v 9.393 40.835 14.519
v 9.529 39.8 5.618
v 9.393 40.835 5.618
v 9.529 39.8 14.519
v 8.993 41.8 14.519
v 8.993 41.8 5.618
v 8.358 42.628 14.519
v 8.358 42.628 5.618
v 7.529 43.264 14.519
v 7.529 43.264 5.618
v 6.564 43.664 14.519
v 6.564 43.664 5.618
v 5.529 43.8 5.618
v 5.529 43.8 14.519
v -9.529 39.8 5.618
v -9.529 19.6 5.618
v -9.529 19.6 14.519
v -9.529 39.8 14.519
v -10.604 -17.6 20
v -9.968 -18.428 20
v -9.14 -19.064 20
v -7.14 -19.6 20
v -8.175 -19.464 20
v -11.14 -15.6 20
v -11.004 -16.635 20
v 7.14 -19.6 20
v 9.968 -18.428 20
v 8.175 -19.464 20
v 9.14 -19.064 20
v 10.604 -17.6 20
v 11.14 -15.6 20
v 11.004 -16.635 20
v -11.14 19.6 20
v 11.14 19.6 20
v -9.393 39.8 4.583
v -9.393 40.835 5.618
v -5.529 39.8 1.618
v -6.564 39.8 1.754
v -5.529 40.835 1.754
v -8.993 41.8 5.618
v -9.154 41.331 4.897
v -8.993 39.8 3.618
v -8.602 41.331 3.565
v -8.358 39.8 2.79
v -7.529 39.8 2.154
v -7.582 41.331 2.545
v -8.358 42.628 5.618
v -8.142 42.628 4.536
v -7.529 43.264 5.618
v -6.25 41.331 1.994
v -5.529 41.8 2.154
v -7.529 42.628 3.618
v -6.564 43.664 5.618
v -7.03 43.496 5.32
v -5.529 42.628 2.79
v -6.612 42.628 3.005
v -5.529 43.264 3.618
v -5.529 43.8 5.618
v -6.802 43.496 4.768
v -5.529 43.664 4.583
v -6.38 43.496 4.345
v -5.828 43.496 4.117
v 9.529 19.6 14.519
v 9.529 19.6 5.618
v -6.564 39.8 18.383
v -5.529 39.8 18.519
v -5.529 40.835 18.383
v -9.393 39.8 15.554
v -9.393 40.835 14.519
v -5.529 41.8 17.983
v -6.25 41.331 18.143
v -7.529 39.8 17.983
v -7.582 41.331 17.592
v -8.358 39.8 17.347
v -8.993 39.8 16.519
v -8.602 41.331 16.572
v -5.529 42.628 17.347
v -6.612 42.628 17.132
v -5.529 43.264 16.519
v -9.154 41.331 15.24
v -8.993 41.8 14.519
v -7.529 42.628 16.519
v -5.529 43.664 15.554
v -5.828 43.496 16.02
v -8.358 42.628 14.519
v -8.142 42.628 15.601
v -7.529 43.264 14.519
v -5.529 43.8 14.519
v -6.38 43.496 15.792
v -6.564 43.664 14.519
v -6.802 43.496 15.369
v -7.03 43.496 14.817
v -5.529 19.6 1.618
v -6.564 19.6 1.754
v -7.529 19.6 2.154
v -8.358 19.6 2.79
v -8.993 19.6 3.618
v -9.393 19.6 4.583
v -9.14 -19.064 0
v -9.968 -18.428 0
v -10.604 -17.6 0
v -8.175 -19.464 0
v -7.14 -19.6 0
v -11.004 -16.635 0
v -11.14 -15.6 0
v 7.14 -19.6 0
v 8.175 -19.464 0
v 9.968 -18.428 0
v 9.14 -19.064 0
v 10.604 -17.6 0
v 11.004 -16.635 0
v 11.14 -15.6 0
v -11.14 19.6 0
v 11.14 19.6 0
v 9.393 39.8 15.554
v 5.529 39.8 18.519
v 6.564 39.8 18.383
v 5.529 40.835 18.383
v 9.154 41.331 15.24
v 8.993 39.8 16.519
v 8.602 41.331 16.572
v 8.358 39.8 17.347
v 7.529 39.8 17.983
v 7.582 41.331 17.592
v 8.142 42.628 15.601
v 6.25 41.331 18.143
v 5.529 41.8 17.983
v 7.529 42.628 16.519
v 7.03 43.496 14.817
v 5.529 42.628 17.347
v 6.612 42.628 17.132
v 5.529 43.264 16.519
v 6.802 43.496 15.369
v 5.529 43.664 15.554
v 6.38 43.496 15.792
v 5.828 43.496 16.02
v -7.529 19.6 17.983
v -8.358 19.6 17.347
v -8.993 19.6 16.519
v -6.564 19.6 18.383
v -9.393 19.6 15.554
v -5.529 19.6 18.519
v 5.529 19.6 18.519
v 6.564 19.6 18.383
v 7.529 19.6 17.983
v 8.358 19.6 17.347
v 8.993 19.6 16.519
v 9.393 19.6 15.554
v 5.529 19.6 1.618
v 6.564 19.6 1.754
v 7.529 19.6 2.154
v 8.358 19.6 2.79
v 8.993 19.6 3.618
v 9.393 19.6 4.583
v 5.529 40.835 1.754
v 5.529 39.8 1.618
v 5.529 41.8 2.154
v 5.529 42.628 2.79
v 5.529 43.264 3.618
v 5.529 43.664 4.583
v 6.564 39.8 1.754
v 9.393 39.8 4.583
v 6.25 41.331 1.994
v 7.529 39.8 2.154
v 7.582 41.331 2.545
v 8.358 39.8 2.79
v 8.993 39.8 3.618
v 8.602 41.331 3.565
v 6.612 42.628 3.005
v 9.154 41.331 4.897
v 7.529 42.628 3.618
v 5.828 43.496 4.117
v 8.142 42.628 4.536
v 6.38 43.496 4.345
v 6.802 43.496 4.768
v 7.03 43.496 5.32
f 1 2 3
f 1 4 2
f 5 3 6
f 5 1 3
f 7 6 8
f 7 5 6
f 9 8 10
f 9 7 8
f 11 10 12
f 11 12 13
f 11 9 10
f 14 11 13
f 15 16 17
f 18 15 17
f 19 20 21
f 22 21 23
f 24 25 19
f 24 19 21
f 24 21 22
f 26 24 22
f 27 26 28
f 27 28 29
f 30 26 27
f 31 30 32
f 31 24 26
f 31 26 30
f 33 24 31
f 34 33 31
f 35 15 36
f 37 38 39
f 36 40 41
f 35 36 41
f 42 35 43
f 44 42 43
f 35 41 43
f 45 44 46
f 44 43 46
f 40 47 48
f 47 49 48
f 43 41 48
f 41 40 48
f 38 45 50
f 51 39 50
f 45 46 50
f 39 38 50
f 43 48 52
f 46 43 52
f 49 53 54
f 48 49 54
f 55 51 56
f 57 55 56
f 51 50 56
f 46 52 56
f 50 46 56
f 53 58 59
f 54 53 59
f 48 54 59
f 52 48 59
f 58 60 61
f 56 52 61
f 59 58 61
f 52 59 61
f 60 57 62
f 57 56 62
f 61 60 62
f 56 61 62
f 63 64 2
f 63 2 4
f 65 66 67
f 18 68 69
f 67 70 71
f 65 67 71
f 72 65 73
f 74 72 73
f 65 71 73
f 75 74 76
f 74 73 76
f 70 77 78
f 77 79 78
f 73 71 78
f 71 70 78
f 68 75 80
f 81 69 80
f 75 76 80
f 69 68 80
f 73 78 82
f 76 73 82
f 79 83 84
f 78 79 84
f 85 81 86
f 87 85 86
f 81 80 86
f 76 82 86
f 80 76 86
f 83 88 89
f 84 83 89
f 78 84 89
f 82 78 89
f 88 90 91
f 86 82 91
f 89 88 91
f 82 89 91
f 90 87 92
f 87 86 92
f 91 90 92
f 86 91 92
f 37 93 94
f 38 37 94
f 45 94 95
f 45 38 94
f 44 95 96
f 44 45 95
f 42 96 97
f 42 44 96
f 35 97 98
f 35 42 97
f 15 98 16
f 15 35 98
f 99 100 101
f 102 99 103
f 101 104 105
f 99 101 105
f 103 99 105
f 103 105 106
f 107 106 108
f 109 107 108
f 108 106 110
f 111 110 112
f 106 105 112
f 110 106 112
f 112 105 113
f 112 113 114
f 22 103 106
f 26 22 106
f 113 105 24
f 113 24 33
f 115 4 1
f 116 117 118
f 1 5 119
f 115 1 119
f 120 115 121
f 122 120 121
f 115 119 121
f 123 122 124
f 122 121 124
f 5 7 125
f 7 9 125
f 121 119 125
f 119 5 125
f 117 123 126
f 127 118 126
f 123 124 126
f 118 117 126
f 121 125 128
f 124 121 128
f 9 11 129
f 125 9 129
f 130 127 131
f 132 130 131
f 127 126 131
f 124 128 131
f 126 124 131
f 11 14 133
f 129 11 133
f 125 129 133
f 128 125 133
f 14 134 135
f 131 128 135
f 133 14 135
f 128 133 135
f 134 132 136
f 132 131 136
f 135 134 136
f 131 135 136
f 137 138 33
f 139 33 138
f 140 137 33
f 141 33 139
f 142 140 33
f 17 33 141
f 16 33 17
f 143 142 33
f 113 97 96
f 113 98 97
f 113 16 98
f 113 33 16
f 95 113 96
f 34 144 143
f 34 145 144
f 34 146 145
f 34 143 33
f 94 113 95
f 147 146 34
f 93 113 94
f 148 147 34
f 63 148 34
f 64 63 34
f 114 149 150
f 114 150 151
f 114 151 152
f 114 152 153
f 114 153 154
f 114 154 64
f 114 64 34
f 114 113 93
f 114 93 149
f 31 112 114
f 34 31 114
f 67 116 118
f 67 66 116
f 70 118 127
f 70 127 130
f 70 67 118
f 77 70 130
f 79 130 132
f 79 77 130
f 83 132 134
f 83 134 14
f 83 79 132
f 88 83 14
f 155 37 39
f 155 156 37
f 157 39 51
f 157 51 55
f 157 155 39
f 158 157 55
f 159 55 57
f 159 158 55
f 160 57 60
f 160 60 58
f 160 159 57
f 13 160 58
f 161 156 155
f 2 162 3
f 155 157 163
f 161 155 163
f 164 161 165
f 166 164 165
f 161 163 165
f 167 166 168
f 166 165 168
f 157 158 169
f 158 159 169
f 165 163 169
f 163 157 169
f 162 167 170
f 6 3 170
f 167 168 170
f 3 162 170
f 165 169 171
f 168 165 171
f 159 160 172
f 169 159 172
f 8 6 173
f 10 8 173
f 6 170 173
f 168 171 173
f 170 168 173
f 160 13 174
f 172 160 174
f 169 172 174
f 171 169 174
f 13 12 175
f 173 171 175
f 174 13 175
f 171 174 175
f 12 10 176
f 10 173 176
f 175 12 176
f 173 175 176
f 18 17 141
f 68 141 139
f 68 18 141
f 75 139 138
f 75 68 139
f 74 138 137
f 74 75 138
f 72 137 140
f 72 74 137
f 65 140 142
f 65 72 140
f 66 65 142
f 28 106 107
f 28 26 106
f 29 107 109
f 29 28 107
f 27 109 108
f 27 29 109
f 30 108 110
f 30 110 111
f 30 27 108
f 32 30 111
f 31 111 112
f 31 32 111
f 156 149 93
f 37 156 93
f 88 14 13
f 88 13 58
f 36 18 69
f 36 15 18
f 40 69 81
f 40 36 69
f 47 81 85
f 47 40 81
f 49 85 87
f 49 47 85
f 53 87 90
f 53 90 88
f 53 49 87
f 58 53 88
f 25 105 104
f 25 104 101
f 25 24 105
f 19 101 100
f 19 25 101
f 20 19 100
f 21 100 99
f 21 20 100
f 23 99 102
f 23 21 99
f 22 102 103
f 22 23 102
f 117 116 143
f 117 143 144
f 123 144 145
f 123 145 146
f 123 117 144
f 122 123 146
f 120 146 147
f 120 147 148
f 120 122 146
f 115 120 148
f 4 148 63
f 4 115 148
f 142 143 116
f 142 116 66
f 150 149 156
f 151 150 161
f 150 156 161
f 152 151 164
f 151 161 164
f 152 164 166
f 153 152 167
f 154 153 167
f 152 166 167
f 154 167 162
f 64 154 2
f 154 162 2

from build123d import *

# Parameters (mm, degrees)
F0_W     = 22.28
F0_H     = 39.2
F1_DEPTH = 20
F2_R     = 4
F3_W     = 19.058216
F3_H     = 16.900683
F4_DEPTH = 24.2
F5_R     = 4
F6_R     = 4


with BuildPart() as f1:
    # F0 (on Top) → F1 (new body)
    with BuildSketch(Plane.XY):
        Rectangle(F0_W, F0_H)
    extrude(amount=F1_DEPTH)

    # F2
    f2_edges = [f1.edges().sort_by_distance(p)[0] for p in [
        (-11.14, -19.6, 10),
        (11.14, -19.6, 10),
    ]]
    fillet(f2_edges, radius=F2_R)

    # F3 (on face) → F4 (join)
    with BuildSketch(Plane(origin=(0, 19.6, 0), x_dir=(-1, 0, 0), z_dir=(0, 1, 0))):
        with Locations((0, 10.068494)):
            Rectangle(F3_W, F3_H)
    extrude(amount=F4_DEPTH)

    # F5
    f5_edges = [f1.edges().sort_by_distance(p)[0] for p in [
        (-9.529108, 31.7, 1.618153),
        (9.529108, 31.7, 1.618153),
        (-9.529108, 31.7, 18.518836),
        (9.529108, 31.7, 18.518836),
    ]]
    fillet(f5_edges, radius=F5_R)

    # F6
    f6_edges = [f1.edges().sort_by_distance(p)[0] for p in [
        (9.529108, 43.8, 10.068495),
        (0, 43.8, 18.518836),
        (-9.529108, 43.8, 10.068495),
        (0, 43.8, 1.618153),
    ]]
    fillet(f6_edges, radius=F6_R)


solid = f1.part
